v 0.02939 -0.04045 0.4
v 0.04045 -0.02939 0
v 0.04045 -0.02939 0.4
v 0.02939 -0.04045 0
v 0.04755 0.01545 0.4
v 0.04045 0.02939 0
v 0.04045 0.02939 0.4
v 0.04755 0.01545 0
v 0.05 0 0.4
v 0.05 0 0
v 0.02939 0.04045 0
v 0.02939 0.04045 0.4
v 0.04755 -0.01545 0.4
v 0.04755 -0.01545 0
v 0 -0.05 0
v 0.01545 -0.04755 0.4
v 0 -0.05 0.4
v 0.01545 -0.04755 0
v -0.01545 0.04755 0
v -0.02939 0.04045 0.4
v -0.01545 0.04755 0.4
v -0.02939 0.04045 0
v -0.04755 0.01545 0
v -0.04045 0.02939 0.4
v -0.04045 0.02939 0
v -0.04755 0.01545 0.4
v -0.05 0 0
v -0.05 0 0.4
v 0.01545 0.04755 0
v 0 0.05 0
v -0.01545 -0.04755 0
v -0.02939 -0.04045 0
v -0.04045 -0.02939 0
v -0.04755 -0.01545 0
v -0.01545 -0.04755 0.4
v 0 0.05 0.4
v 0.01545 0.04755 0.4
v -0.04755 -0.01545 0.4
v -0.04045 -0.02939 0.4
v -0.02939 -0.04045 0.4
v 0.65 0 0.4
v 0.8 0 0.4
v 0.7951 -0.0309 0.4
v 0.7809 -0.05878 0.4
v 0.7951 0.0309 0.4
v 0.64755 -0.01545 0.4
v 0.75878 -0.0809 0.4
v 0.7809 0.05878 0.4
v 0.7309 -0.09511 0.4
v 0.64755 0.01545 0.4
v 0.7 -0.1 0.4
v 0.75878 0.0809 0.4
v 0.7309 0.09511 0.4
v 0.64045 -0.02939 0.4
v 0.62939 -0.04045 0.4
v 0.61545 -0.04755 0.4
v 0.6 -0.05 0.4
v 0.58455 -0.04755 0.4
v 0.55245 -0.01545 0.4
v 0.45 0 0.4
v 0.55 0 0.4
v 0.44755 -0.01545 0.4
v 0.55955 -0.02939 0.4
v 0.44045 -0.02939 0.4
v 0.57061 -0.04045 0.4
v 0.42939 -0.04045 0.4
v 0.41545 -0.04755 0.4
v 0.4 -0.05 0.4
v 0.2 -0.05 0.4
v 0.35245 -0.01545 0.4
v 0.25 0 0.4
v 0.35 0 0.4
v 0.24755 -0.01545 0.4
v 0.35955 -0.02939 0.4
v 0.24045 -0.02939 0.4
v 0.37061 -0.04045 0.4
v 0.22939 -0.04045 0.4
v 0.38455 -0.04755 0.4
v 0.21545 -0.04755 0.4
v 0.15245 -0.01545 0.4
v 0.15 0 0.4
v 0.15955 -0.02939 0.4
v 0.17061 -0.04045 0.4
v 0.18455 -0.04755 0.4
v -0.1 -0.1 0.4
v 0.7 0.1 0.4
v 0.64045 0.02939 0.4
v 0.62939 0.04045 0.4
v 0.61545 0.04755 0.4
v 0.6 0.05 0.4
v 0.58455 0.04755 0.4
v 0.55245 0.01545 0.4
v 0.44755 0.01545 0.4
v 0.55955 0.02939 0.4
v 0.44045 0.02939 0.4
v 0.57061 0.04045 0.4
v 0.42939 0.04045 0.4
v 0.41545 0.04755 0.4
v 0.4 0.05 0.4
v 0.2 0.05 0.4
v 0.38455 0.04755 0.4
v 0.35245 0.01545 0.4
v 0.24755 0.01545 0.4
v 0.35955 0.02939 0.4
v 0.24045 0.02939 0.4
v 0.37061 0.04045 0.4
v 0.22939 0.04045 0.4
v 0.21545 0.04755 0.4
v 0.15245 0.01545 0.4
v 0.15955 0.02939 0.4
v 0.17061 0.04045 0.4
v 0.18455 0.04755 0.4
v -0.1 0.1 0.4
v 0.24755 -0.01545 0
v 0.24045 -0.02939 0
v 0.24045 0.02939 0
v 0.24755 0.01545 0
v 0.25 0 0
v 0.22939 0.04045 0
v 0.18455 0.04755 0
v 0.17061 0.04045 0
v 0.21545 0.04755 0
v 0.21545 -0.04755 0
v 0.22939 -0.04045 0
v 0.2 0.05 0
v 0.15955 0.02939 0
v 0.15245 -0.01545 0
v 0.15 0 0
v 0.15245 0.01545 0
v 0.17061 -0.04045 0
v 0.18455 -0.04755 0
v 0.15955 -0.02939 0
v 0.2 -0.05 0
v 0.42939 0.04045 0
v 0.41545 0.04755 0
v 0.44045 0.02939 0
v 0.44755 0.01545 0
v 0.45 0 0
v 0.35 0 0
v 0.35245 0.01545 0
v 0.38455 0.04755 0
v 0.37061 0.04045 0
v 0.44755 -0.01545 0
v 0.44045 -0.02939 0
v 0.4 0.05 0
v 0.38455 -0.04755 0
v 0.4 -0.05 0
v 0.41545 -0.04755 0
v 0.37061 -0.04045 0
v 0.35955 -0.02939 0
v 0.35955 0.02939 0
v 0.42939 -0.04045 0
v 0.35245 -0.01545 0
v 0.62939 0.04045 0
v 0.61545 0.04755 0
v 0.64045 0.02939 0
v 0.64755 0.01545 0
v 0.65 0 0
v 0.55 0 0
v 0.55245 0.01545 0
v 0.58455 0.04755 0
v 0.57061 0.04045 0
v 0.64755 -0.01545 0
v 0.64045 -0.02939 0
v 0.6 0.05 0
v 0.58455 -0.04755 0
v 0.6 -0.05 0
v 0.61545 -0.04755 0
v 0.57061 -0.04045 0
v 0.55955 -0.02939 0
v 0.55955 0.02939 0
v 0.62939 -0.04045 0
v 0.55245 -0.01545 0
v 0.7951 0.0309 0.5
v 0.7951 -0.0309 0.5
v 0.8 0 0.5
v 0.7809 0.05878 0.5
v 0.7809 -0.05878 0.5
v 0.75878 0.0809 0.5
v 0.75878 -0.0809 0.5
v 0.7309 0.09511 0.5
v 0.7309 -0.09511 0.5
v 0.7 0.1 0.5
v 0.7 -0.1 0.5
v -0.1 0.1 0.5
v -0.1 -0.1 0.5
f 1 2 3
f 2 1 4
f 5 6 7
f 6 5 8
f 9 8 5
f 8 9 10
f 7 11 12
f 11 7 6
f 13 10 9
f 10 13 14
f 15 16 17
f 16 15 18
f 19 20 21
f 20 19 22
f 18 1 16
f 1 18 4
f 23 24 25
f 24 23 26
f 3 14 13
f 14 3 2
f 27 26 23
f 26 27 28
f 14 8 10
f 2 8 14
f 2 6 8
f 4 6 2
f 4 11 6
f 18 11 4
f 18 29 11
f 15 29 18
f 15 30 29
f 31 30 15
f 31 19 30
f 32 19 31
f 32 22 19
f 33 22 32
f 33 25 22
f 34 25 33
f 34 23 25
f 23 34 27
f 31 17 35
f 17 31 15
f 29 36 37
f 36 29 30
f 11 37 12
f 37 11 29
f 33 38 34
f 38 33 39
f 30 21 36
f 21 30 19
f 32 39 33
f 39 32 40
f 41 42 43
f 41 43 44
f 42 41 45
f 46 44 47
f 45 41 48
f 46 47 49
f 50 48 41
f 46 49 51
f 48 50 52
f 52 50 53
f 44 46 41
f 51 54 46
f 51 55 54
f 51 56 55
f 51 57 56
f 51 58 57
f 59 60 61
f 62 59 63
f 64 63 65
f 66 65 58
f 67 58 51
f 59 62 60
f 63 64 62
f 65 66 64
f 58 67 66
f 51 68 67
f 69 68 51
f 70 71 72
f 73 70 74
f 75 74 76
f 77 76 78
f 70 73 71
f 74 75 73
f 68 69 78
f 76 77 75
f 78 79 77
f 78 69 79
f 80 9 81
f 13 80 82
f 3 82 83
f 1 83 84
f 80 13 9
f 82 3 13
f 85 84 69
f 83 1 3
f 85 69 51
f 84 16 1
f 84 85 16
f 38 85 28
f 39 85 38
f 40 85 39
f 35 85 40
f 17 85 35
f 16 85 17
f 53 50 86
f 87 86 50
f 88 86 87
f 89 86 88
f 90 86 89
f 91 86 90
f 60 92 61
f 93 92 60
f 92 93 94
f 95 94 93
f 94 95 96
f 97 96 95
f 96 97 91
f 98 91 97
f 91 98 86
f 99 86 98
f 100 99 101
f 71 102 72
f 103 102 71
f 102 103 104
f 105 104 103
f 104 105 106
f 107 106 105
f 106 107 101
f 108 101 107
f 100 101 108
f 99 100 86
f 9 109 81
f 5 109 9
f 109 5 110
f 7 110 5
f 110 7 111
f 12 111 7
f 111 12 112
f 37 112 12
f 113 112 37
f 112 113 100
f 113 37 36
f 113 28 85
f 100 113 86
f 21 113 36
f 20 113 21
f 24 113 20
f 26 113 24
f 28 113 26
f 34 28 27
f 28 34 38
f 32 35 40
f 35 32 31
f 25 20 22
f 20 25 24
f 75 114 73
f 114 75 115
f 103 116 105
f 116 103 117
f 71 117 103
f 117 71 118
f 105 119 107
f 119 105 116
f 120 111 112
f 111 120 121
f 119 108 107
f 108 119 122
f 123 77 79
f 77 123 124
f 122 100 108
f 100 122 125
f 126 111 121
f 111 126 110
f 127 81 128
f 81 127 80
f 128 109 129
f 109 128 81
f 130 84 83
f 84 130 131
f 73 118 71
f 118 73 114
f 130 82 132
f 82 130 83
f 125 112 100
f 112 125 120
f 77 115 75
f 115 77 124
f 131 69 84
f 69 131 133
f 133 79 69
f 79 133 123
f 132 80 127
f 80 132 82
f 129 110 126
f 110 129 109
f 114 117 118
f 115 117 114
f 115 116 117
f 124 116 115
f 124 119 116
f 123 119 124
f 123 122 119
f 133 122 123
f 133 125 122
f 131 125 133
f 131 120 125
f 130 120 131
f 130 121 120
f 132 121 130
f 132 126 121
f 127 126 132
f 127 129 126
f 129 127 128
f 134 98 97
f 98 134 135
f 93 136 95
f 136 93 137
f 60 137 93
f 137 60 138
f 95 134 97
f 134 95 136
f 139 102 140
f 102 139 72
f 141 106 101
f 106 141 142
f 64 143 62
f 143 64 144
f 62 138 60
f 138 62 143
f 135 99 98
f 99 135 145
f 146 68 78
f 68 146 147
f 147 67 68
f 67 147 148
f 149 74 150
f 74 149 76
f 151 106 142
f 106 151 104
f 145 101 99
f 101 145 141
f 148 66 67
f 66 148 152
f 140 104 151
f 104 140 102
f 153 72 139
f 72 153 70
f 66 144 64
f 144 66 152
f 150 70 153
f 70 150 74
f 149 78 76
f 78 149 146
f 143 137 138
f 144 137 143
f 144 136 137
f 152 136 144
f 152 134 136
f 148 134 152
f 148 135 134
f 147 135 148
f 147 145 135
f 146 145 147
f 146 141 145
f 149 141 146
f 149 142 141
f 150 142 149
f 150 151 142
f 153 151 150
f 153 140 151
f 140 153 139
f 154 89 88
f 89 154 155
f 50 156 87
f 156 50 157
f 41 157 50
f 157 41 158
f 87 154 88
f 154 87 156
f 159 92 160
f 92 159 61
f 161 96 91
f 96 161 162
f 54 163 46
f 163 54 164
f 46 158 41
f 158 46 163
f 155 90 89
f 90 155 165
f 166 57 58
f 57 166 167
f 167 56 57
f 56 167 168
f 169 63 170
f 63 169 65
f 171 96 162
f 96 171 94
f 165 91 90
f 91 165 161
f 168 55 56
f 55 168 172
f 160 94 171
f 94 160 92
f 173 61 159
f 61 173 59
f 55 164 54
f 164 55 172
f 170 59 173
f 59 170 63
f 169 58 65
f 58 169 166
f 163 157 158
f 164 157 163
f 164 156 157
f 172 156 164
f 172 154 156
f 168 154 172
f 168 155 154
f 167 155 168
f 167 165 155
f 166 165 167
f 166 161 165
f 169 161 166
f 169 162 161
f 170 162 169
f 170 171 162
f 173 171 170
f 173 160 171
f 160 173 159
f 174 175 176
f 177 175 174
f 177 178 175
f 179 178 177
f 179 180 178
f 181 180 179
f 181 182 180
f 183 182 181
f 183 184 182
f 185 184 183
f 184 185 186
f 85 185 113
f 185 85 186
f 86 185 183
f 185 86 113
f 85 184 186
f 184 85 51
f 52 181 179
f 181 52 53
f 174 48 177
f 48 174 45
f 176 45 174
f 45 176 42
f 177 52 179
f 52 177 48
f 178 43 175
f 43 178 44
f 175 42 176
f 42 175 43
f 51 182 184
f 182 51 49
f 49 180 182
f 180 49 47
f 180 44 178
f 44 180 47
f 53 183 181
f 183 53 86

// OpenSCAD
// Railing


union() {
    length = 0.6;
    height=0.4;
    post_radius=0.05;
    rail_radius=0.03;

    // Posts
    for (i = [0:0.2:length]) {
        translate([i, 0, 0]) {
            cylinder(h = height, r = post_radius, $fn = 20);
        }
    }

    translate([-.1, -.1, height])
    cube([0.8, .2, .1]);

    translate([0.7, 0, height])
    cylinder(h=0.1, r=0.1, $fn=20);
}
